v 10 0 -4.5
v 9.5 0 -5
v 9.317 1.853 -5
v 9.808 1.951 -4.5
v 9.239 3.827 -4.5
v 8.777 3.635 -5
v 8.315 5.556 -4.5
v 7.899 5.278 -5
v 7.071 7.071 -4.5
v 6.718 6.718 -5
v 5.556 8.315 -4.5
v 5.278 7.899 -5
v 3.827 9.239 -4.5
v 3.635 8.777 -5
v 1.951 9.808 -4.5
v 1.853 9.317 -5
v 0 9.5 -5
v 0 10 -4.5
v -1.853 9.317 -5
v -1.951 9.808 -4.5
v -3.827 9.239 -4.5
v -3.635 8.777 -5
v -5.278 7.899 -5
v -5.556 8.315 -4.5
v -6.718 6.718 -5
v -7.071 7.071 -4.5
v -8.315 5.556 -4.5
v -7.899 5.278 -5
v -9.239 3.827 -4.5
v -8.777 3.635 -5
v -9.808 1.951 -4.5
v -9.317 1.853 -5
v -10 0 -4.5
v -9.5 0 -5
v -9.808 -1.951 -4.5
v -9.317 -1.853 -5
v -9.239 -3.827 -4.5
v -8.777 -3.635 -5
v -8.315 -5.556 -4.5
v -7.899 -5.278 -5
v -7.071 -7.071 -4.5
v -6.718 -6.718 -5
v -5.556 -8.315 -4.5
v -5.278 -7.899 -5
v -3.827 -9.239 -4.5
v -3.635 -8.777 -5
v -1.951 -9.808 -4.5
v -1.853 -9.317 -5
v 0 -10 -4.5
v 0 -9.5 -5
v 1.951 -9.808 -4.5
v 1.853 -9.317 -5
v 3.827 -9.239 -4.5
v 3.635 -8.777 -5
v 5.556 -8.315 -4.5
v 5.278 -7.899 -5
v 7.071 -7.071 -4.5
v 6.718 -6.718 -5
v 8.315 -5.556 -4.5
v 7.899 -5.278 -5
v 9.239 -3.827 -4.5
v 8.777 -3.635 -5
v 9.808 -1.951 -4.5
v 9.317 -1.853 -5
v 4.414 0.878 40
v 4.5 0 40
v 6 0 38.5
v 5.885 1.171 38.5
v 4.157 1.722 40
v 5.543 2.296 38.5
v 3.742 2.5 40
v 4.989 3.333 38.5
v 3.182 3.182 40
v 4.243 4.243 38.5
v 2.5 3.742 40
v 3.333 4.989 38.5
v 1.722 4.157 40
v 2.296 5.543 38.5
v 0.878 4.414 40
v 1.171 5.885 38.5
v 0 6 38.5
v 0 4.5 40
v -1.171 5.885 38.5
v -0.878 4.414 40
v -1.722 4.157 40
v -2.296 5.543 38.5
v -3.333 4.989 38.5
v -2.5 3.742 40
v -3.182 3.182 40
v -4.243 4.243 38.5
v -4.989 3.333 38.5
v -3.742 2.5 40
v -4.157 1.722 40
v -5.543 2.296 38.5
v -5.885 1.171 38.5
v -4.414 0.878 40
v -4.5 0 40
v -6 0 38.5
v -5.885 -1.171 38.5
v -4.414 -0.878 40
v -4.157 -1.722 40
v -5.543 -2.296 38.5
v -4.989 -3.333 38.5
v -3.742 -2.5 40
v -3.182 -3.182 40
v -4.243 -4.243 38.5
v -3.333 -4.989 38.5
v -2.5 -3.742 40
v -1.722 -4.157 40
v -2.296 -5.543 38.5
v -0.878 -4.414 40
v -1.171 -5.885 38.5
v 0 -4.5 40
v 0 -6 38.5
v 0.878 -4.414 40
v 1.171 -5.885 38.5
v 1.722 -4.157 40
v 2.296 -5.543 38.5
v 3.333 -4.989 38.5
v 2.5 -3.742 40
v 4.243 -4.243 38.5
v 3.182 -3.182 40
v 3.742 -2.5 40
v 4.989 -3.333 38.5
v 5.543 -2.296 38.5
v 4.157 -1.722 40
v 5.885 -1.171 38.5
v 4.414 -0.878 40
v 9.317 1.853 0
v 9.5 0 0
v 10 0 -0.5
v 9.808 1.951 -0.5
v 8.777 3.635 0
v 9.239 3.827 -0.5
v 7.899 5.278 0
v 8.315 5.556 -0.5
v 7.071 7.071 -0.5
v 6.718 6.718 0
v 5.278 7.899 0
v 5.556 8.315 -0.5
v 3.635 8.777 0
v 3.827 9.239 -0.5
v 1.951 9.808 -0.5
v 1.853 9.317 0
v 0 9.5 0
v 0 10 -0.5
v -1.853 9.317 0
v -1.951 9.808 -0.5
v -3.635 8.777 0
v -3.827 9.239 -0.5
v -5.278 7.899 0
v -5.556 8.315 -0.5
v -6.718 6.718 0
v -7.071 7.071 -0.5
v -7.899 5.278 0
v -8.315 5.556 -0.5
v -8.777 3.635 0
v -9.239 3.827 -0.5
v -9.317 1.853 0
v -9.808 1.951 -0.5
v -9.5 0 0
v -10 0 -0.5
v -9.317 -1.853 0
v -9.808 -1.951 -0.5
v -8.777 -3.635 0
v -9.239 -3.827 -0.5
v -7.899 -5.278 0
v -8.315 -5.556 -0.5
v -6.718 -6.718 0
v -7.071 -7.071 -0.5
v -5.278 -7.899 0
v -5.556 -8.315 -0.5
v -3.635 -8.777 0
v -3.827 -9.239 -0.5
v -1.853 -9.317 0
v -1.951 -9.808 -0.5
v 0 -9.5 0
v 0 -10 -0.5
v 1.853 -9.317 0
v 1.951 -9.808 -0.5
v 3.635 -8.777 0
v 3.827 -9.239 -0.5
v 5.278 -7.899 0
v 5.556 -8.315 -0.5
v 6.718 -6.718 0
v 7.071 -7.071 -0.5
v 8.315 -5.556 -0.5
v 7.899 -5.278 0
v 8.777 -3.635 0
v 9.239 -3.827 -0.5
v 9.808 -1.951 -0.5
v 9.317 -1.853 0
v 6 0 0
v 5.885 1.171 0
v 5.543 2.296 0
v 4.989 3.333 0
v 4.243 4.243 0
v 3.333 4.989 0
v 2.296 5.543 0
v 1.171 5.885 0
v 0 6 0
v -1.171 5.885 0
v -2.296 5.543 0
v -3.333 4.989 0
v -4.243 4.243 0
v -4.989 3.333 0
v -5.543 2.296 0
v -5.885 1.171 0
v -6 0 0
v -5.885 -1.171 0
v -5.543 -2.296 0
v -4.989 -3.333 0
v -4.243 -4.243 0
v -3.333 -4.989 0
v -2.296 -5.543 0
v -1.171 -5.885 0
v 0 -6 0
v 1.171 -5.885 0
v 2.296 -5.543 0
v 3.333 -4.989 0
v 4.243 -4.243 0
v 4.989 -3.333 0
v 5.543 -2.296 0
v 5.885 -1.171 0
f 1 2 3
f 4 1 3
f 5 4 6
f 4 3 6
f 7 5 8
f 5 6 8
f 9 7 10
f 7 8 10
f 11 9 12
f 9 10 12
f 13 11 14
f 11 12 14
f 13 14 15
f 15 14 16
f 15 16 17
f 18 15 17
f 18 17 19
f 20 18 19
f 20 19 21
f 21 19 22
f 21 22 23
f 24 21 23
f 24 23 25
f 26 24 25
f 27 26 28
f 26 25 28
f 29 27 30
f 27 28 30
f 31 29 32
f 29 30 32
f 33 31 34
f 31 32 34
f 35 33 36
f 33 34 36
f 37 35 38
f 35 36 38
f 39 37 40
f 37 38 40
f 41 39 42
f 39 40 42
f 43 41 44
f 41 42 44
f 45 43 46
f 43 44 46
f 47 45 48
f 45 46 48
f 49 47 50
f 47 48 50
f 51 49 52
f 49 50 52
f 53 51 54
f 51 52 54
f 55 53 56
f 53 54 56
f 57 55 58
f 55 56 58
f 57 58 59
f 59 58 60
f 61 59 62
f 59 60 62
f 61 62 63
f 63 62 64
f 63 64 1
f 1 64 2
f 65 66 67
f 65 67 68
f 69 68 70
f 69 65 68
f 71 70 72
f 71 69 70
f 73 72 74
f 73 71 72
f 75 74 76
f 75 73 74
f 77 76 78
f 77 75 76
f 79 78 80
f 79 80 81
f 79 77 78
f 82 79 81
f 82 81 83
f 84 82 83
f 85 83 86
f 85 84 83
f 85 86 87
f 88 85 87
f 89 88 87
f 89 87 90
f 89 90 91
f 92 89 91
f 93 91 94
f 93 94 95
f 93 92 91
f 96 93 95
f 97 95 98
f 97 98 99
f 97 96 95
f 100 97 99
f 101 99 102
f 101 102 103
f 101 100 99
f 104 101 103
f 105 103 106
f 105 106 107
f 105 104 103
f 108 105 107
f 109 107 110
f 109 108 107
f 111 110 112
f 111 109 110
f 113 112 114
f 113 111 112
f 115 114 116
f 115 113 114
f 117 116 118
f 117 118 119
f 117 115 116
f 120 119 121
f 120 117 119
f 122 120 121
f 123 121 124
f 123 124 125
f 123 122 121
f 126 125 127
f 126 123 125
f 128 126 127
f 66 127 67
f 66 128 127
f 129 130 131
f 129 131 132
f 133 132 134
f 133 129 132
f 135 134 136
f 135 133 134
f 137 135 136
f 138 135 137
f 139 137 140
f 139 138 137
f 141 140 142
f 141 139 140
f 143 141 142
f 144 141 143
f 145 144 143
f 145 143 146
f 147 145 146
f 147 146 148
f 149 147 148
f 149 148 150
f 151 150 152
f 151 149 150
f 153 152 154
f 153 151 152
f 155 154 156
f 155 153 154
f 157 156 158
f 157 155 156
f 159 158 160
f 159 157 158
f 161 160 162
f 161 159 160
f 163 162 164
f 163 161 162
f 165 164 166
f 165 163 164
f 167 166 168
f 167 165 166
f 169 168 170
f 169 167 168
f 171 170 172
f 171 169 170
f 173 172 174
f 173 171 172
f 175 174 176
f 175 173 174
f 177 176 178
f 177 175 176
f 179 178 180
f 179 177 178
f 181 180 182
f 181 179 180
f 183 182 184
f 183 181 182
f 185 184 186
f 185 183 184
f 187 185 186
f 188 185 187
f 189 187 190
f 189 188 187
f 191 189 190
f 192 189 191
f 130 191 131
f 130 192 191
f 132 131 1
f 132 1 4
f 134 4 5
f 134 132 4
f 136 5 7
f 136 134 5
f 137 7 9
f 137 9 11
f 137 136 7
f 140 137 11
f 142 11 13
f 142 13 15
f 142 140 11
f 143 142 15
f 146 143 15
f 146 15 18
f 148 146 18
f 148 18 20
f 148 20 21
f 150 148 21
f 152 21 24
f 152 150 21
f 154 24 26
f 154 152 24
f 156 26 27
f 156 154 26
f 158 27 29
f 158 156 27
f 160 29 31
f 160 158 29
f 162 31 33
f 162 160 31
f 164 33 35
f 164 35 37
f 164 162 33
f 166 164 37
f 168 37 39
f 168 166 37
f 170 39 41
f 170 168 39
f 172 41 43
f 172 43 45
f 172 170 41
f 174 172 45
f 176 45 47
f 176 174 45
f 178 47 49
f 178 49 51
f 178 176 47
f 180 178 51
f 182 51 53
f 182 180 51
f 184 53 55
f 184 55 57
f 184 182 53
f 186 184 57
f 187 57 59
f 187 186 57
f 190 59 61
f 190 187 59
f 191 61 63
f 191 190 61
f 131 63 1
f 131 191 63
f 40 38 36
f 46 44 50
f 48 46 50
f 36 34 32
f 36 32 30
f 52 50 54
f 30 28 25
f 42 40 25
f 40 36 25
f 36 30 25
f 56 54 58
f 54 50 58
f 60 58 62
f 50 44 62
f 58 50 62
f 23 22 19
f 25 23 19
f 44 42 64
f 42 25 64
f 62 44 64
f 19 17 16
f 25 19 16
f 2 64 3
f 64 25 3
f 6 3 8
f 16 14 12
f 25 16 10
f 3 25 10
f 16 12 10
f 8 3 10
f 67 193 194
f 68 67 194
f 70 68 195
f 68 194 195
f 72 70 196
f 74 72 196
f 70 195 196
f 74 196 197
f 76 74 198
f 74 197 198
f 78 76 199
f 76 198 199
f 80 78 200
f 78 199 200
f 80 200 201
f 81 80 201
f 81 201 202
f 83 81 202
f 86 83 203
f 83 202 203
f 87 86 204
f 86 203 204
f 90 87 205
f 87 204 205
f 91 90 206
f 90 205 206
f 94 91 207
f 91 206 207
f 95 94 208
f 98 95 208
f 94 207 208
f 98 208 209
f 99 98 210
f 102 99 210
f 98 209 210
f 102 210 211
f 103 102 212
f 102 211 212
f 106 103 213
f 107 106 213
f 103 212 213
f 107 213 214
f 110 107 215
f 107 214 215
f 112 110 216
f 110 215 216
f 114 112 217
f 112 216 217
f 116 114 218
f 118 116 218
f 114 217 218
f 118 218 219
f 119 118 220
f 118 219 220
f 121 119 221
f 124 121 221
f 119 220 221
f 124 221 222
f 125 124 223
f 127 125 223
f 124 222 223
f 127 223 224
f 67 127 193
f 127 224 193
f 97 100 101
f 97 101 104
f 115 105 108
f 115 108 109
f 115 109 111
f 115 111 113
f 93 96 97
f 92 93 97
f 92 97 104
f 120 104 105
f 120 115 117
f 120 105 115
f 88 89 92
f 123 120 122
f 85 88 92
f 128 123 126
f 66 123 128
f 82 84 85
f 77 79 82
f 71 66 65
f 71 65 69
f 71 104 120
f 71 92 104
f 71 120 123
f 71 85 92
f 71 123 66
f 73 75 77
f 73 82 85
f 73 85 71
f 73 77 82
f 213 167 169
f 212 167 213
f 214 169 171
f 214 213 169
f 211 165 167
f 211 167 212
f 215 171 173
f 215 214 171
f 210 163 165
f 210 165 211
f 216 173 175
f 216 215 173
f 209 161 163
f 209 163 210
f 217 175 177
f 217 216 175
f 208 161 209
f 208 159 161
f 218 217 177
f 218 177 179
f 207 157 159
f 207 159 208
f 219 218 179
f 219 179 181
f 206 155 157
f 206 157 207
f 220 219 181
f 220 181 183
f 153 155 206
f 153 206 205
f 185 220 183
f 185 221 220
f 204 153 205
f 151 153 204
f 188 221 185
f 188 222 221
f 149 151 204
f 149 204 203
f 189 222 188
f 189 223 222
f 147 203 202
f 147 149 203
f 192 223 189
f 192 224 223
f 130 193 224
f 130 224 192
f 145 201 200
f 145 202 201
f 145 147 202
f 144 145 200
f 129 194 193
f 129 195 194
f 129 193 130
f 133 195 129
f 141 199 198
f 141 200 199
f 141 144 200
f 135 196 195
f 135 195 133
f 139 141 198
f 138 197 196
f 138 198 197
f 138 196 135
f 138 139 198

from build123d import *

# Parameters (mm, degrees)
F1_R     = 6
F2_DEPTH = 40
F0_R     = 10
F3_DEPTH = 5
F4_SIZE  = 0.5
F5_SIZE  = 1.5


# Not quite as in the source:
# - the program builds the solid bodies; features that only make, move or delete a surface that nothing else refers to are left out


with BuildPart() as f2:
    # F1 (on face) → F2 (new body)
    with BuildSketch(Plane.XY):
        Circle(F1_R)
    extrude(amount=F2_DEPTH)

    # F0 (on Top) → F3 (join)
    with BuildSketch(Plane.XY):
        Circle(F0_R)
    extrude(amount=-F3_DEPTH)

    # F4
    f4_edges = [f2.edges().sort_by_distance(p)[0] for p in [
        (-10, 0, 0),
        (-10, 0, -5),
    ]]
    chamfer(f4_edges, length=F4_SIZE)

    # F5
    f5_edges = [f2.edges().sort_by_distance(p)[0] for p in [
        (-6, 0, 40),
    ]]
    chamfer(f5_edges, length=F5_SIZE)


solid = f2.part
